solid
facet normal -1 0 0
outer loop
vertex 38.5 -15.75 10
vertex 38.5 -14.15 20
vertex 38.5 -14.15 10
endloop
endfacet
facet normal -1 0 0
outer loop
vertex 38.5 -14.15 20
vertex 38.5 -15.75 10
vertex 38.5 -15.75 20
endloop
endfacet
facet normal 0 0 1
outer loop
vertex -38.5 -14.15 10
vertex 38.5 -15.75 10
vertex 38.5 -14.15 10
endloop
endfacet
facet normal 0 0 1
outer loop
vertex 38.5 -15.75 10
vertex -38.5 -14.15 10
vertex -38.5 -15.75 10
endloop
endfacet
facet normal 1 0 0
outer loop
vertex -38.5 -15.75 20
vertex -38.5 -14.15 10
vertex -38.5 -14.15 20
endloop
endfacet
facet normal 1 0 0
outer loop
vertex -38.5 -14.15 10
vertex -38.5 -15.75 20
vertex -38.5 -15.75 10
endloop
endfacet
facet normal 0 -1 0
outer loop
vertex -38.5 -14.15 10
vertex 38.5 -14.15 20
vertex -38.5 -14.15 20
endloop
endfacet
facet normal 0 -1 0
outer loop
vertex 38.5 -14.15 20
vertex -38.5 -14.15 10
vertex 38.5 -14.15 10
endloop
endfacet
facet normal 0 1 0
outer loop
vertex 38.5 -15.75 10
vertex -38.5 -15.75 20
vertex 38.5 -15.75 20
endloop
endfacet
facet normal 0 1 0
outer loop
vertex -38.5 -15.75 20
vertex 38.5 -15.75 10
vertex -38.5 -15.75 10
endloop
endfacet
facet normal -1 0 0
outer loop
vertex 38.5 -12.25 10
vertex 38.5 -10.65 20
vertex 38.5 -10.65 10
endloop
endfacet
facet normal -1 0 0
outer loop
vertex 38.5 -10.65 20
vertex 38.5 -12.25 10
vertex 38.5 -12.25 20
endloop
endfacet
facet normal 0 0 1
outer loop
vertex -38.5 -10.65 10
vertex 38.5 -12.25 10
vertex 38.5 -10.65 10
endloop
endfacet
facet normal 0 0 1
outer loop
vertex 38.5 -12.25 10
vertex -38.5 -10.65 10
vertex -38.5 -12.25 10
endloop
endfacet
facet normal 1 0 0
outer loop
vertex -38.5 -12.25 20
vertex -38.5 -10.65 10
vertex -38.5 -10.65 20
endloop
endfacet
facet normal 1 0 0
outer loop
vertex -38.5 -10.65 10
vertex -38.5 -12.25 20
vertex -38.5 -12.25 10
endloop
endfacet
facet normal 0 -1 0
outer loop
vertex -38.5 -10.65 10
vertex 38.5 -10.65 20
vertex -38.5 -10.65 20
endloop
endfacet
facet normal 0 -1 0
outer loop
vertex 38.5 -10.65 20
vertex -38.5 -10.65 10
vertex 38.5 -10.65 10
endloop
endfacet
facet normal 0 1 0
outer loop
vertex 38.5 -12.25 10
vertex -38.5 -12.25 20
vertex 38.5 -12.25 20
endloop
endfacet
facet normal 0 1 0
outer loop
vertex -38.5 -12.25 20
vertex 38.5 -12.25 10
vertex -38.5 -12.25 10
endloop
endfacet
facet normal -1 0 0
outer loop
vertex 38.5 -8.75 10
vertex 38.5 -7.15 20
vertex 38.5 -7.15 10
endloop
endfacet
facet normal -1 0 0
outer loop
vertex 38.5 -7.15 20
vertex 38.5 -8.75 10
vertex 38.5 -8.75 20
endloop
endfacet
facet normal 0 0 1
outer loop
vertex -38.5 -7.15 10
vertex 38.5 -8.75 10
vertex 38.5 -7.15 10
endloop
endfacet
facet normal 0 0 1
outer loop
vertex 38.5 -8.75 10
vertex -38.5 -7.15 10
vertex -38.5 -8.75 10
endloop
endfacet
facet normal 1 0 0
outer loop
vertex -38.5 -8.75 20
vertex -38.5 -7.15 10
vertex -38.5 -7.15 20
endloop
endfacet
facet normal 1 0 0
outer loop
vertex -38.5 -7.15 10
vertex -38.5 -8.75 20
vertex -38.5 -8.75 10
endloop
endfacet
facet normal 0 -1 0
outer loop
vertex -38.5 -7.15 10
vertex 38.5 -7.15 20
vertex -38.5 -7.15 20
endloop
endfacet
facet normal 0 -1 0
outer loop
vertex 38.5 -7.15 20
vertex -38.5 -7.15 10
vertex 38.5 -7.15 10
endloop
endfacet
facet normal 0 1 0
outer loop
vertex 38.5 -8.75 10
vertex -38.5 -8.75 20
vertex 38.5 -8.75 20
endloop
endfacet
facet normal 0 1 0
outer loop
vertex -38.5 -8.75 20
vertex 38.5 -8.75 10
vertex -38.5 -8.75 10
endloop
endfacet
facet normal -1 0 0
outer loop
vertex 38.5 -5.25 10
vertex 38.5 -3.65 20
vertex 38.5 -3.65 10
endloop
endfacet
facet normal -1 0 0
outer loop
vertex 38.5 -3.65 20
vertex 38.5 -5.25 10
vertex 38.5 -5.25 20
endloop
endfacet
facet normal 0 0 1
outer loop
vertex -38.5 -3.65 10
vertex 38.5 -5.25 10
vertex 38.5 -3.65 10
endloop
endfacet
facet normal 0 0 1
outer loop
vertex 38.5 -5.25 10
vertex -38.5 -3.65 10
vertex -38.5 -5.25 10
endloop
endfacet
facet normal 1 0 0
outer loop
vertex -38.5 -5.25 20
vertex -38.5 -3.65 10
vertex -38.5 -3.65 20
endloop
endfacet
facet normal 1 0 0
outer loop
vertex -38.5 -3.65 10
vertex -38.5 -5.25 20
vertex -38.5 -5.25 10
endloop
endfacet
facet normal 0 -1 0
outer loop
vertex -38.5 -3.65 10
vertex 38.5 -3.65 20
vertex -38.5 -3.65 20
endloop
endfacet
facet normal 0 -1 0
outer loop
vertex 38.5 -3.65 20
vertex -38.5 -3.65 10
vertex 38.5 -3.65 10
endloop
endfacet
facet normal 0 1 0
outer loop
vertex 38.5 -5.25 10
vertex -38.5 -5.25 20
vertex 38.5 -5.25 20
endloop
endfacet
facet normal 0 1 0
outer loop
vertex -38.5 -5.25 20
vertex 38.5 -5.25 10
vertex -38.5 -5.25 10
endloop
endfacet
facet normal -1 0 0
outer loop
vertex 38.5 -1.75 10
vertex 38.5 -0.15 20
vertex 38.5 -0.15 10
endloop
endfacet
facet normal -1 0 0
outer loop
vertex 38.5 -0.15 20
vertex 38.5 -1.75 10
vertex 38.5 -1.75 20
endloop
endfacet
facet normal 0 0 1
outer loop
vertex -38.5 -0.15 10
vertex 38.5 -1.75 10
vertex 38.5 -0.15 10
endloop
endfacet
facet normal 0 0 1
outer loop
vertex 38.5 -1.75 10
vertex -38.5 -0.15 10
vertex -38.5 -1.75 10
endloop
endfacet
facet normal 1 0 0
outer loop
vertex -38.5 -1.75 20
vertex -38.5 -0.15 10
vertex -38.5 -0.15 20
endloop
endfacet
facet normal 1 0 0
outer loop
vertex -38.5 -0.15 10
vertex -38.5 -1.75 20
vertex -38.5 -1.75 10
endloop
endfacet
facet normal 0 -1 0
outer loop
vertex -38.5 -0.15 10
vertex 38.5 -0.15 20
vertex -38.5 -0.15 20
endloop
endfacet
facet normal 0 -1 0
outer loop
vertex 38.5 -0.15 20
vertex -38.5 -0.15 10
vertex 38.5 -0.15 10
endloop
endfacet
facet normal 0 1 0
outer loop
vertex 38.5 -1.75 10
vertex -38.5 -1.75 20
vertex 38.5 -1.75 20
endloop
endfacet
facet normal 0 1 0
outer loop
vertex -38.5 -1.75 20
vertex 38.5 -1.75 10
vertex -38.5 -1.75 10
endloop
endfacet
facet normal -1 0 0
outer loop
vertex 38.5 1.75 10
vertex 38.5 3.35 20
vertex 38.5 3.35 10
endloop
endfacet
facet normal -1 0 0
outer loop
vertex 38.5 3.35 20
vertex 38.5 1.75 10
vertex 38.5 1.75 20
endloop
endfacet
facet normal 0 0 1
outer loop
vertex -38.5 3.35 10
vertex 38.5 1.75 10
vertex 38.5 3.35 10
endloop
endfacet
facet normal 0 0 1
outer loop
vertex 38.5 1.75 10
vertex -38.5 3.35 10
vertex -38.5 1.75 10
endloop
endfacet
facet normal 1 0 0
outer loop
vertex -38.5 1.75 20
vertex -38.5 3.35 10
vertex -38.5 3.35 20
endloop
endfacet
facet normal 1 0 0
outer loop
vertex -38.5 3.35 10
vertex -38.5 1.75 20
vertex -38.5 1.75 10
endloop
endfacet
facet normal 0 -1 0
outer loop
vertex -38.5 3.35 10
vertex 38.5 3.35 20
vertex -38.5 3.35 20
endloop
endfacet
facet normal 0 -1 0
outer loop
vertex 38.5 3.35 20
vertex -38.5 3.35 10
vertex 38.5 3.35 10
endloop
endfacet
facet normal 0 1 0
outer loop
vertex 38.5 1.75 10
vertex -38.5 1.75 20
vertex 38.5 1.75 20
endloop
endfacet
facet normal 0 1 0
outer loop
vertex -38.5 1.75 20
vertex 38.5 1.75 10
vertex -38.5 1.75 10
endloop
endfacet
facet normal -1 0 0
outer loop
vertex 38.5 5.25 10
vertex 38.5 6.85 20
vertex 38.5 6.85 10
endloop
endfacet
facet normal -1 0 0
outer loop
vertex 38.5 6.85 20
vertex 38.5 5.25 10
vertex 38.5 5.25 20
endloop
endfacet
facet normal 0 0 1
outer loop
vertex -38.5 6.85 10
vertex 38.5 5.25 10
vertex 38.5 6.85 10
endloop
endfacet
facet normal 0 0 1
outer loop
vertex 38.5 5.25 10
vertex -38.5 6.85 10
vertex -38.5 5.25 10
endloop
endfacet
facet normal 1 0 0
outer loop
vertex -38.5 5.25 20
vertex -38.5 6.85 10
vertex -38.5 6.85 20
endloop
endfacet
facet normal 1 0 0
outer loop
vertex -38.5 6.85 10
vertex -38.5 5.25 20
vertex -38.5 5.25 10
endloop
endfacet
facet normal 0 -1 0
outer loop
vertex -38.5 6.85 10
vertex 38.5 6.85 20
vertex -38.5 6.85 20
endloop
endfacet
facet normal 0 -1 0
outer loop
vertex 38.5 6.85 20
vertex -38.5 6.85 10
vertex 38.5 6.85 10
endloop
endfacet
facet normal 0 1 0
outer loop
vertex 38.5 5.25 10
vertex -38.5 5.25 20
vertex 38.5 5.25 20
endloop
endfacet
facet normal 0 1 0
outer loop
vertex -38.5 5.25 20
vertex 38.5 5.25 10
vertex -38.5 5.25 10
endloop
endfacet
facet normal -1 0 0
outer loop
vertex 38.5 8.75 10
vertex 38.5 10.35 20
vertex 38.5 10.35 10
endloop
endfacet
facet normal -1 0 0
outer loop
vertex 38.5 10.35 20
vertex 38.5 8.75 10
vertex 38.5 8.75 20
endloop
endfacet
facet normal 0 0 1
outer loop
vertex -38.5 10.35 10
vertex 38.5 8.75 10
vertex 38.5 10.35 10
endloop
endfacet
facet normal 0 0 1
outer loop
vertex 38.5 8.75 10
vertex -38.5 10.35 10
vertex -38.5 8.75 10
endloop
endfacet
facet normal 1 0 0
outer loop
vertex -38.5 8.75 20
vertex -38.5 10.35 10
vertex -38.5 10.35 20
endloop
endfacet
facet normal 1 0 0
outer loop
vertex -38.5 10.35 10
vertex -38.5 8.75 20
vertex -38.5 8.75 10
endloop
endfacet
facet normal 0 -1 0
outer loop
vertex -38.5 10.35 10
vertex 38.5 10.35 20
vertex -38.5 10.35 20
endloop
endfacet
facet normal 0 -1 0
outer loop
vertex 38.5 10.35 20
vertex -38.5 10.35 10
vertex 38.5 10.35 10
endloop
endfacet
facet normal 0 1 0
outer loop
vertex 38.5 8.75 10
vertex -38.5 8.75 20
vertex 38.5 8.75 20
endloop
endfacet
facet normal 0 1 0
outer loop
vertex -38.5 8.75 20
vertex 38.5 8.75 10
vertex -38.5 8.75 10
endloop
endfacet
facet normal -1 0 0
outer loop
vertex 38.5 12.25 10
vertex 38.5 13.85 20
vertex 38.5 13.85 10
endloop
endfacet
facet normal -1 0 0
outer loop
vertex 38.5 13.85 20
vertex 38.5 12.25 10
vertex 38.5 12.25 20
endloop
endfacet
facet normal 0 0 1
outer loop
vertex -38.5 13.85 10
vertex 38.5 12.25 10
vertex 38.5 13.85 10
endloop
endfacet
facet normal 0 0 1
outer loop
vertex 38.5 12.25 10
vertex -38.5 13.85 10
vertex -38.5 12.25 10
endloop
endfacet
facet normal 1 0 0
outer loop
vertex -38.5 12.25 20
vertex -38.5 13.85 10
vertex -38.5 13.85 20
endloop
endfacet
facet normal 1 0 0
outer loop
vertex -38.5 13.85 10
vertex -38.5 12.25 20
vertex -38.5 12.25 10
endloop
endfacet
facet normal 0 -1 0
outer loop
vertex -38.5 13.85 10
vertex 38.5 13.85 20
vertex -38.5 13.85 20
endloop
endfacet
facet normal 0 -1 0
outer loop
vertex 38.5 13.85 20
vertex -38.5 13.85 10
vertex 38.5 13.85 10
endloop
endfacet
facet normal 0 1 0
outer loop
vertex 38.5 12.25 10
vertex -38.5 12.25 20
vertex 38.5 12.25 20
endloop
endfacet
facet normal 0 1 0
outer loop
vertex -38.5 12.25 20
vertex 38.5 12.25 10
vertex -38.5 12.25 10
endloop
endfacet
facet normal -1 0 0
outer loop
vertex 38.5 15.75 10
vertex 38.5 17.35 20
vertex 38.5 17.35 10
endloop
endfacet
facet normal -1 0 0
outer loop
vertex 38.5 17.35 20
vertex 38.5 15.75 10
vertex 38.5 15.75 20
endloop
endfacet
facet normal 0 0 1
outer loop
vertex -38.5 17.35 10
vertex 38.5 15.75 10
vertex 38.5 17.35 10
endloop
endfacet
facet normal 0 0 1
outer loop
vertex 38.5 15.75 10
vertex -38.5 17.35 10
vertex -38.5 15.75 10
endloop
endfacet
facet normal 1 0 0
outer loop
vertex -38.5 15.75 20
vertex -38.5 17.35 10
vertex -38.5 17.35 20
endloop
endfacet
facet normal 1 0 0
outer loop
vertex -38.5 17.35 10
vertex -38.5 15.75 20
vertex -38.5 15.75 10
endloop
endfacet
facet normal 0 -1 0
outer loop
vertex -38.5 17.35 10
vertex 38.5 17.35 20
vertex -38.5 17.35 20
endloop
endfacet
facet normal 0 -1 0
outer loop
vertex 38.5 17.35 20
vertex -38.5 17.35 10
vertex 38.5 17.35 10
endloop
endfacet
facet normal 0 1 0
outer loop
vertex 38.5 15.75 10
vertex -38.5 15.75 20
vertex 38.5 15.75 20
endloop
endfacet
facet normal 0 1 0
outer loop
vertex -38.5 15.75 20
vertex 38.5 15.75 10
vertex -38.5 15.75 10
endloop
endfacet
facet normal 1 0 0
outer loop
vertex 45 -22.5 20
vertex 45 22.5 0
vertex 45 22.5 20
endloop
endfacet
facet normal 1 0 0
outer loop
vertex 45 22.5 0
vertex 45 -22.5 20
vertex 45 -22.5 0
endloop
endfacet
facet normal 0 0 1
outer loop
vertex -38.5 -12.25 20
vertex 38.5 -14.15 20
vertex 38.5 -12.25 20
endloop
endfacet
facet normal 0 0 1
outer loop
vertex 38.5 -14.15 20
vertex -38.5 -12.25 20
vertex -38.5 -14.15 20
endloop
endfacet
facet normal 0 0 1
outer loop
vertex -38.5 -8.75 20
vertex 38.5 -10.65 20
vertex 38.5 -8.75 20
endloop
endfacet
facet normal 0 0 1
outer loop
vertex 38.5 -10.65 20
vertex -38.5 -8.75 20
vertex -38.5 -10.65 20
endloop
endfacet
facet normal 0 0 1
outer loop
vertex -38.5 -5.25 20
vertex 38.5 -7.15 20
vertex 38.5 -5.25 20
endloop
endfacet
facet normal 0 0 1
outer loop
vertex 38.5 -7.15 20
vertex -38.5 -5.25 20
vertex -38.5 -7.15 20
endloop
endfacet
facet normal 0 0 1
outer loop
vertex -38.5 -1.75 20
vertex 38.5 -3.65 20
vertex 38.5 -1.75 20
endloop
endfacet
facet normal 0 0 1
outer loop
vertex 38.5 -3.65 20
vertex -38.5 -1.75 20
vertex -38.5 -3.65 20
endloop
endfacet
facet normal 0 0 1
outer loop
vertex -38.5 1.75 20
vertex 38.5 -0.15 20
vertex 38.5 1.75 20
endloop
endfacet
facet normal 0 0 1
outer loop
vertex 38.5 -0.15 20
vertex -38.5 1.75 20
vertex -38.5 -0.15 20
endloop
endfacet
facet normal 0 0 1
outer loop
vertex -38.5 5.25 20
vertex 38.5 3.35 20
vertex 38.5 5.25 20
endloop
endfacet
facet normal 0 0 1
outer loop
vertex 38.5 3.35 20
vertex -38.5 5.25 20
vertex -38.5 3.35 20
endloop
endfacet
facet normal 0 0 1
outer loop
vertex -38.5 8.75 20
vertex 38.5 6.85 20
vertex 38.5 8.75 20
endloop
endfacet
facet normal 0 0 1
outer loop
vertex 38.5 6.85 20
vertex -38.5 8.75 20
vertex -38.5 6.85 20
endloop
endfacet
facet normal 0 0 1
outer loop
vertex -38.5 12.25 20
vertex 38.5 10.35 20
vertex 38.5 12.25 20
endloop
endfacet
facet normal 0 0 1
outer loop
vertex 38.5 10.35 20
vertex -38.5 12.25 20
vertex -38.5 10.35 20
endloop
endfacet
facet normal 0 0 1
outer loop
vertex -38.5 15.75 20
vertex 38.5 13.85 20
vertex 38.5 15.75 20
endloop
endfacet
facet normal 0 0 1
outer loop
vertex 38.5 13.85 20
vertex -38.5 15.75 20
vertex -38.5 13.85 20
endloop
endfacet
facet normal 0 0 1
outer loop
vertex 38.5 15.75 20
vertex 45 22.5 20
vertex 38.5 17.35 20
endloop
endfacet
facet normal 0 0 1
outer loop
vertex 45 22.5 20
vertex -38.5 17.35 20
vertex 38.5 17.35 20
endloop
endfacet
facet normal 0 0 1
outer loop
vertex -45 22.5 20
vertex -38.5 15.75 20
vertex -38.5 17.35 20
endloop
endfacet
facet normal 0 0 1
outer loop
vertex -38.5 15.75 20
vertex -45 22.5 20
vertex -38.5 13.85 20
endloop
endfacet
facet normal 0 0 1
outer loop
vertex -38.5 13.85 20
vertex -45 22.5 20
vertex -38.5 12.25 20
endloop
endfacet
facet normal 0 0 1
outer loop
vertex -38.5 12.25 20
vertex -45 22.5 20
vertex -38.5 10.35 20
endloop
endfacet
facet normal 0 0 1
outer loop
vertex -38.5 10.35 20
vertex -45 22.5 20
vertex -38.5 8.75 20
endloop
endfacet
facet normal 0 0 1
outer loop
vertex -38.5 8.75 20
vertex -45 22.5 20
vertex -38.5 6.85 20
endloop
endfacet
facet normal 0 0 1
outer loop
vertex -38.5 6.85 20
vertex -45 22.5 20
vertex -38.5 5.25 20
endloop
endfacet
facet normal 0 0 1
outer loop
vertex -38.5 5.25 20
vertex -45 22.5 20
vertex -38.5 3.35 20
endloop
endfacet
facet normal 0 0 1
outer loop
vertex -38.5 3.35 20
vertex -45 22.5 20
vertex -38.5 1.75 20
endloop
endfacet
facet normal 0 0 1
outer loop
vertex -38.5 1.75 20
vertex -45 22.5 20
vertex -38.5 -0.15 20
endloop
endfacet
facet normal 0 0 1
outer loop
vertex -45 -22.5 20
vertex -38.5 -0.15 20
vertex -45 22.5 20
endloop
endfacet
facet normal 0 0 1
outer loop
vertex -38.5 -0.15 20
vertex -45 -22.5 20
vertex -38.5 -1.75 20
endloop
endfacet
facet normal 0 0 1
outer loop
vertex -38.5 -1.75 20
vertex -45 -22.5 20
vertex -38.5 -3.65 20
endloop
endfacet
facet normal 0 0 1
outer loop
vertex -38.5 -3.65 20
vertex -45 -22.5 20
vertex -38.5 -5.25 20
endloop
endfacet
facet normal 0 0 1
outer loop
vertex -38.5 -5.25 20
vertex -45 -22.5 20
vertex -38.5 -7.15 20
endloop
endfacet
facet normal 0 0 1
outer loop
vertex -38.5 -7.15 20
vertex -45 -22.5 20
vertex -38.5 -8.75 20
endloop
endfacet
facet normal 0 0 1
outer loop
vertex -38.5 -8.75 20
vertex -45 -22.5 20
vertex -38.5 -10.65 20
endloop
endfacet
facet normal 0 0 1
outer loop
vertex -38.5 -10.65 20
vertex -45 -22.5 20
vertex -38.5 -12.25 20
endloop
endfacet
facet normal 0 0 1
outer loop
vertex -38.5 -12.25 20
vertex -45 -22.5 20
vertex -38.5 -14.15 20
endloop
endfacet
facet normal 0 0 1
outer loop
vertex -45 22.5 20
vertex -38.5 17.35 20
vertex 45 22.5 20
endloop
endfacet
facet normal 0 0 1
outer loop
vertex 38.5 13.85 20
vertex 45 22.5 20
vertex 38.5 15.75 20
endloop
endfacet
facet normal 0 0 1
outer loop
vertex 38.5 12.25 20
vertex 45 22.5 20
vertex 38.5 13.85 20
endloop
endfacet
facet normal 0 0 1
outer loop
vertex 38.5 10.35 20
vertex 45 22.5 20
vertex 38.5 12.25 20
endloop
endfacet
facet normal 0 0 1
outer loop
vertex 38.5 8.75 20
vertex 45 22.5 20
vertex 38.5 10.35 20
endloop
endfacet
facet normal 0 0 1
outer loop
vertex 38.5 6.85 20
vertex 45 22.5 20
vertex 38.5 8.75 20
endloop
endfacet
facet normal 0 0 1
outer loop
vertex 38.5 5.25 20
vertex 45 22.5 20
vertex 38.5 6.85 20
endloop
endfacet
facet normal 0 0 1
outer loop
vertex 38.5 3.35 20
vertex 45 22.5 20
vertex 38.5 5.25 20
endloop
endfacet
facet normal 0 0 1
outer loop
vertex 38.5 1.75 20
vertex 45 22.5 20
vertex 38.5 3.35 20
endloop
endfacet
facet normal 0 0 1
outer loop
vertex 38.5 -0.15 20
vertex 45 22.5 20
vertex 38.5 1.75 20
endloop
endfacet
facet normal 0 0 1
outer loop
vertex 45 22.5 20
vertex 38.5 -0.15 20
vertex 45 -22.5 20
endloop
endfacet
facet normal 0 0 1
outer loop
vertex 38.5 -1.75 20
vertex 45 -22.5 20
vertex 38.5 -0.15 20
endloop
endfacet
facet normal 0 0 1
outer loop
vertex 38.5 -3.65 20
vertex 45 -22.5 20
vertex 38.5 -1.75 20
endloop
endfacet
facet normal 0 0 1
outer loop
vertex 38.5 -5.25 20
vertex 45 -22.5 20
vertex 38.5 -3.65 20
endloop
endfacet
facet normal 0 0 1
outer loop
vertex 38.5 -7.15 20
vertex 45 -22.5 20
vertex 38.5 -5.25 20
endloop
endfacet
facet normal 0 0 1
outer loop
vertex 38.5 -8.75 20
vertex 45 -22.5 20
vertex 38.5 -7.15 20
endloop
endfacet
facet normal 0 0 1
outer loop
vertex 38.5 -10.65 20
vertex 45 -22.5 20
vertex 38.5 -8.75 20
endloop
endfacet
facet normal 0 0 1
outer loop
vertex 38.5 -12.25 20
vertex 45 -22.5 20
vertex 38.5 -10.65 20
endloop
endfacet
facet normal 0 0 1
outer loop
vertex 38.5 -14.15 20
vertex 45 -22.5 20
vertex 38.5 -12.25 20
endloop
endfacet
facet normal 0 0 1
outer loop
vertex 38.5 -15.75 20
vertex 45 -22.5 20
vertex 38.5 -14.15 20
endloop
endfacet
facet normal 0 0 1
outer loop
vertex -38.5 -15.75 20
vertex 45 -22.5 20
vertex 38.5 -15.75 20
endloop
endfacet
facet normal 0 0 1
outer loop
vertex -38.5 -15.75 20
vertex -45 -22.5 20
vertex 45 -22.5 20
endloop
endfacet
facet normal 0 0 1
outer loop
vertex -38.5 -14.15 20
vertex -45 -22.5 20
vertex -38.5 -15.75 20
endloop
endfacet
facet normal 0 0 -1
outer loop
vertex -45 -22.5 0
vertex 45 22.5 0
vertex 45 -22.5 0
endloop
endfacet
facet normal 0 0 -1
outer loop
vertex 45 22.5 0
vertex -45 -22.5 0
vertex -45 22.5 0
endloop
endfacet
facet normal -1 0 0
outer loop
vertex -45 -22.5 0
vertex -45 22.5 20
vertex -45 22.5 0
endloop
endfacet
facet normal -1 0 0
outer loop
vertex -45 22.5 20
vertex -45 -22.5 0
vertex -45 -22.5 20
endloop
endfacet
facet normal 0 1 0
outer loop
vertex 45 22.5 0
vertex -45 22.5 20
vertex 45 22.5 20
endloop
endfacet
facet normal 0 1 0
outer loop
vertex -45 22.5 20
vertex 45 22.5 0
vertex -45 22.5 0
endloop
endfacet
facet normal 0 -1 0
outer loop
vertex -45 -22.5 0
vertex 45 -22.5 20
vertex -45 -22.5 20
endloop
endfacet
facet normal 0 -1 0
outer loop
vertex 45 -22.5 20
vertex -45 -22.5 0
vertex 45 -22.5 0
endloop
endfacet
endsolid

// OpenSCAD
// Slide drying rack - holds 10 microscope slides standing upright on their long edge
// Print orientation: base block on the bed (z = 0), slots open at the top

// ---------------- Parameters ----------------
block_len    = 90;    // block length along X (mm)
block_wid    = 45;    // block width along Y (mm)
block_h      = 20;    // block height along Z (mm)

slot_count   = 10;    // number of slide slots
slot_len     = 77;    // slot length along X (mm)
slot_w       = 1.6;   // slot width along Y (mm)
slot_depth   = 10;    // slot depth from top face (mm)
slot_pitch   = 3.5;   // centre-to-centre slot spacing along Y (mm)

eps          = 0.5;   // overshoot so cutters pass through the top face (mm)

$fn = 64;

// ---------------- Model ----------------
difference() {
    // Main block, centred in X and Y, resting on z = 0
    translate([-block_len/2, -block_wid/2, 0])
        cube([block_len, block_wid, block_h]);

    // Slot group, centred on the block in X and Y
    for (i = [0 : slot_count - 1]) {
        y = (i - (slot_count - 1)/2) * slot_pitch;
        translate([-slot_len/2, y, block_h - slot_depth])
            cube([slot_len, slot_w, slot_depth + eps]);
    }
}
